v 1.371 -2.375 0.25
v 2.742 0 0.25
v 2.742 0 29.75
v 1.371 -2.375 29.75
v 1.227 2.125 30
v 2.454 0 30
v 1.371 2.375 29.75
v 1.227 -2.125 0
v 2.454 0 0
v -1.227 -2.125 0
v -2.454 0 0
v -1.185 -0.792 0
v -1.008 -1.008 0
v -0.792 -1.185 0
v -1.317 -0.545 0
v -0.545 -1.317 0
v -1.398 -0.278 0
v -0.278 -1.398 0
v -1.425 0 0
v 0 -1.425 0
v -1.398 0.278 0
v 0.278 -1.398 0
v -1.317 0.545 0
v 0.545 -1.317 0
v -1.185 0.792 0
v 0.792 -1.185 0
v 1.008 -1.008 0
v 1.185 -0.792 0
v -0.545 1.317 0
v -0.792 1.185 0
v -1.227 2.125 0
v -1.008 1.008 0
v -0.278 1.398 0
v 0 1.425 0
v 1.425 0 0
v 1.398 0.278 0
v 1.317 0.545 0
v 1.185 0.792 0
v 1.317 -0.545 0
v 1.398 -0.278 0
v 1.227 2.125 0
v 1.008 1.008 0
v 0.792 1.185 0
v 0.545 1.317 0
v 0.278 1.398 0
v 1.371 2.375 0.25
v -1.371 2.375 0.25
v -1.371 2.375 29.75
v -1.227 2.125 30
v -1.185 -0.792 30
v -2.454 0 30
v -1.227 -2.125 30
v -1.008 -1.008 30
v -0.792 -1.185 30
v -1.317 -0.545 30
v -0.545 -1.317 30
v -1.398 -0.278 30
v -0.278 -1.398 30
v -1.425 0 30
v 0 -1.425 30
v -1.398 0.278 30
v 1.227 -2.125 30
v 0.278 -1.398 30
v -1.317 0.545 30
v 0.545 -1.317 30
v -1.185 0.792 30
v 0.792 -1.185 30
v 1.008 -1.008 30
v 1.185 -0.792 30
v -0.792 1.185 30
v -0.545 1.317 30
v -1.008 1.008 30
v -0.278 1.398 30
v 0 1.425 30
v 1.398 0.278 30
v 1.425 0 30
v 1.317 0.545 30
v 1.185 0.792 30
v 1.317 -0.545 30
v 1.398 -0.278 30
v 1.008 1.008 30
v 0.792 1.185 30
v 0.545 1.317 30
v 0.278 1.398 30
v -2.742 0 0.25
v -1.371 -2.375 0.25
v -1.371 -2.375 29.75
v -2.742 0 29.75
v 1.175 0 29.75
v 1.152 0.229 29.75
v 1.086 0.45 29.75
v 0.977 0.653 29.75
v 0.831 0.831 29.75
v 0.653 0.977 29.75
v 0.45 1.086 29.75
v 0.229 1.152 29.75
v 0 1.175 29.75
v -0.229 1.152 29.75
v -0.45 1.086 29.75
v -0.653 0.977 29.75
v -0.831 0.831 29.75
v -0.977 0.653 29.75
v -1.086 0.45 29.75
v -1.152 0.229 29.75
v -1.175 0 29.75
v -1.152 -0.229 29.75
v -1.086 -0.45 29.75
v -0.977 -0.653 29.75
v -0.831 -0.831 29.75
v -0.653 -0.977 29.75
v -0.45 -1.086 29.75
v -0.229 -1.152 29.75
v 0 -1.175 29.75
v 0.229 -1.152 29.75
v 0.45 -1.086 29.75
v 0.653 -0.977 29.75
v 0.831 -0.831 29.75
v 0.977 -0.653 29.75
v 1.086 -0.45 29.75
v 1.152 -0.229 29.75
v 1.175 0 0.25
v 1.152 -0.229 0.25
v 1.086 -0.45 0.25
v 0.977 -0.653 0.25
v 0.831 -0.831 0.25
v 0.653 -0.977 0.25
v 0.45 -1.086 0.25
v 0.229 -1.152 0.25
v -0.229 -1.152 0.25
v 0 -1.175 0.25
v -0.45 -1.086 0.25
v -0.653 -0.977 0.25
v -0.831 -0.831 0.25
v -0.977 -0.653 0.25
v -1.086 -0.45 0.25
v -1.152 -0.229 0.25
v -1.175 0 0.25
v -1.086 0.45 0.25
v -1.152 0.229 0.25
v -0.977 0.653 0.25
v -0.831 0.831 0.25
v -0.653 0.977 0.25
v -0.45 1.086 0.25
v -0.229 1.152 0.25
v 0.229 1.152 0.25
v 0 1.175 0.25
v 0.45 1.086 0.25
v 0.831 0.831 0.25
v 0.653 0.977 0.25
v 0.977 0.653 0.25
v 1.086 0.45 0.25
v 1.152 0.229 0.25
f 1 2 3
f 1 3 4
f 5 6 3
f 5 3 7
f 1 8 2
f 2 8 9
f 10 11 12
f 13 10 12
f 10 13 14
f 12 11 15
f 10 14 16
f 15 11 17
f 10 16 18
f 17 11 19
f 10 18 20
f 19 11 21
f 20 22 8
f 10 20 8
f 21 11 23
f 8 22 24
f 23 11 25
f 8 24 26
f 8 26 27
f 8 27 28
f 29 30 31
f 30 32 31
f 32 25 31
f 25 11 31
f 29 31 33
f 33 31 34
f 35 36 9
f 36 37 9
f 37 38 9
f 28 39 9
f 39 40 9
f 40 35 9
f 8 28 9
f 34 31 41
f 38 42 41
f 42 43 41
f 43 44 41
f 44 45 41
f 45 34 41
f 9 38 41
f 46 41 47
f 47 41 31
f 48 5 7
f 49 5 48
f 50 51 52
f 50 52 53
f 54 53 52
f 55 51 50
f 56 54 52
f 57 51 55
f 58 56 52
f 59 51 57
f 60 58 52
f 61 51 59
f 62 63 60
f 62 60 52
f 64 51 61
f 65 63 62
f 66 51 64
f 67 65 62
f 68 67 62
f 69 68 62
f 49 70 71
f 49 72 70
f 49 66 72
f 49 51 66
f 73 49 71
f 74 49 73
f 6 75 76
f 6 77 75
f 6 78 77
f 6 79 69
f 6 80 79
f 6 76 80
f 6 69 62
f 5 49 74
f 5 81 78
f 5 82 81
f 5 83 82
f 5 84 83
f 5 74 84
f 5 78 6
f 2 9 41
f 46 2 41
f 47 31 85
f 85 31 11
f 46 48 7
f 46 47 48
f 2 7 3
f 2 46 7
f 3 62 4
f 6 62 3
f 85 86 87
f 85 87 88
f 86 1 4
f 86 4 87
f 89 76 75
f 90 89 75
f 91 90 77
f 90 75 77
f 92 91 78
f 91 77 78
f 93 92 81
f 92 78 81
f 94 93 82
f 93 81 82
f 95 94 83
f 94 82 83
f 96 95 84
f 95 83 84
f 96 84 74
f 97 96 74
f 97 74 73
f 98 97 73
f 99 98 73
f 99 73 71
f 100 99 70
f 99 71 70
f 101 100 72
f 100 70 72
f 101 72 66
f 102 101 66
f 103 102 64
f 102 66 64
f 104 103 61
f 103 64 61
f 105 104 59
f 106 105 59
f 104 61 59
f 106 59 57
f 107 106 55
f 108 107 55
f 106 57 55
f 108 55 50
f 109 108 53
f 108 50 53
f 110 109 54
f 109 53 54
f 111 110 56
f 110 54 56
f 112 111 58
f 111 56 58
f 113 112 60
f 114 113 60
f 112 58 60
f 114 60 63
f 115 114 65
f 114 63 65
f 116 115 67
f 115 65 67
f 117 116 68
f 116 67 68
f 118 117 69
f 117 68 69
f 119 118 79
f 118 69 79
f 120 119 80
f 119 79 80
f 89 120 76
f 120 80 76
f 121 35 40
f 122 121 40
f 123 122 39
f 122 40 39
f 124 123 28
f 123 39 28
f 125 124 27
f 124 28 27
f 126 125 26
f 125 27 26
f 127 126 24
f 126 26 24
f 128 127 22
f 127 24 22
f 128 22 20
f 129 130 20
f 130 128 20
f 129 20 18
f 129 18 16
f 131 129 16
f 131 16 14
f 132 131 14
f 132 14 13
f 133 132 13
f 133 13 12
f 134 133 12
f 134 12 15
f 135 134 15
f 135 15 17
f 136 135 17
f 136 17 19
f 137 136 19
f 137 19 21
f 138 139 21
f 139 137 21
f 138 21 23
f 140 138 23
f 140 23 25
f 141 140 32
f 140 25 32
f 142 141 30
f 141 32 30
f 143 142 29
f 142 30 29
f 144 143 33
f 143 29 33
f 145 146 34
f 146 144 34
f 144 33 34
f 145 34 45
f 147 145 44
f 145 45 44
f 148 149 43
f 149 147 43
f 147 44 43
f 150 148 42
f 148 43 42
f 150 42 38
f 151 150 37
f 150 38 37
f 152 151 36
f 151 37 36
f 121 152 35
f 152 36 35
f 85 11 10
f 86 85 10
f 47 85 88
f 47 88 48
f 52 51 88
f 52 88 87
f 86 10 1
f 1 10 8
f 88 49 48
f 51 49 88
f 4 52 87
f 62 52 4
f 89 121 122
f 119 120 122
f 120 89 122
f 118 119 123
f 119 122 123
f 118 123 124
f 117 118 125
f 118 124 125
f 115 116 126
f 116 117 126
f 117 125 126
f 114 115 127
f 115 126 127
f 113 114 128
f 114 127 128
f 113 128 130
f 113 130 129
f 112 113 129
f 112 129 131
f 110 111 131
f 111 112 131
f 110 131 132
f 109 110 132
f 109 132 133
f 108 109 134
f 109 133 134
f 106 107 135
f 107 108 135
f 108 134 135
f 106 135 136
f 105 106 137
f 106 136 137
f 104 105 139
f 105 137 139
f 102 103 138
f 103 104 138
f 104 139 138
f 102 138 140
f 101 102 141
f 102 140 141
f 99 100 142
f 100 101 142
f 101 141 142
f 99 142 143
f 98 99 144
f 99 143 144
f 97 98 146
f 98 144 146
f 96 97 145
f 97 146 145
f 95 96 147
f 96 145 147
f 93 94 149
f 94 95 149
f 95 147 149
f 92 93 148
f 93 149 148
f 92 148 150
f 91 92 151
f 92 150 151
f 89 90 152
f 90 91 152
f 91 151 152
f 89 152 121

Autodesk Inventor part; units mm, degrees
ref_plane "YZ Plane" through (0, 0, 0) normal (1, 0, 0) x (0, 1, 0)
ref_plane "XZ Plane" through (0, 0, 0) normal (0, 1, 0) x (-1, 0, 0)
ref_plane "XY Plane" through (0, 0, 0) normal (0, 0, 1) x (1, 0, 0)
sketch "Sketch1" plane through (0, 0, 0) normal (0, 0, 1) x (1, 0, 0)
  line L0 (1.3712, 2.375) -> (2.7424, 0)
  line L1 (2.7424, 0) -> (1.3712, -2.375)
  line L2 (1.3712, -2.375) -> (-1.3712, -2.375)
  line L3 (-1.3712, -2.375) -> (-2.7424, 0)
  line L4 (-2.7424, 0) -> (-1.3712, 2.375)
  line L5 (-1.3712, 2.375) -> (1.3712, 2.375)
  circle A0 centre (0, 0) radius 1.175
  dimension "d0" = 4.75
  dimension "d1" = 2.35
extrude "Extrusion1" add sketch "Sketch1" along normal blind 30
thread "Thread1" size "M2.5x0.45" class "6H" standard "ANSI Metric M Profile" full length
chamfer "Chamfer1" distance 0.25 angle 45 14 edges at (0, 2.375, 30) (-2.0568, 1.1875, 30) (-2.0568, -1.1875, 30) (2.0568, -1.1875, 30) (2.0568, 1.1875, 30) (2.0568, 1.1875, 0) (0, 2.375, 0) (-2.0568, 1.1875, 0) (-2.0568, -1.1875, 0) (-1.175, 0, 0) (0, -2.375, 0) (2.0568, -1.1875, 0) (-1.175, 0, 30) (0, -2.375, 30)
properties part number "Part3_Poste largo de latón"
